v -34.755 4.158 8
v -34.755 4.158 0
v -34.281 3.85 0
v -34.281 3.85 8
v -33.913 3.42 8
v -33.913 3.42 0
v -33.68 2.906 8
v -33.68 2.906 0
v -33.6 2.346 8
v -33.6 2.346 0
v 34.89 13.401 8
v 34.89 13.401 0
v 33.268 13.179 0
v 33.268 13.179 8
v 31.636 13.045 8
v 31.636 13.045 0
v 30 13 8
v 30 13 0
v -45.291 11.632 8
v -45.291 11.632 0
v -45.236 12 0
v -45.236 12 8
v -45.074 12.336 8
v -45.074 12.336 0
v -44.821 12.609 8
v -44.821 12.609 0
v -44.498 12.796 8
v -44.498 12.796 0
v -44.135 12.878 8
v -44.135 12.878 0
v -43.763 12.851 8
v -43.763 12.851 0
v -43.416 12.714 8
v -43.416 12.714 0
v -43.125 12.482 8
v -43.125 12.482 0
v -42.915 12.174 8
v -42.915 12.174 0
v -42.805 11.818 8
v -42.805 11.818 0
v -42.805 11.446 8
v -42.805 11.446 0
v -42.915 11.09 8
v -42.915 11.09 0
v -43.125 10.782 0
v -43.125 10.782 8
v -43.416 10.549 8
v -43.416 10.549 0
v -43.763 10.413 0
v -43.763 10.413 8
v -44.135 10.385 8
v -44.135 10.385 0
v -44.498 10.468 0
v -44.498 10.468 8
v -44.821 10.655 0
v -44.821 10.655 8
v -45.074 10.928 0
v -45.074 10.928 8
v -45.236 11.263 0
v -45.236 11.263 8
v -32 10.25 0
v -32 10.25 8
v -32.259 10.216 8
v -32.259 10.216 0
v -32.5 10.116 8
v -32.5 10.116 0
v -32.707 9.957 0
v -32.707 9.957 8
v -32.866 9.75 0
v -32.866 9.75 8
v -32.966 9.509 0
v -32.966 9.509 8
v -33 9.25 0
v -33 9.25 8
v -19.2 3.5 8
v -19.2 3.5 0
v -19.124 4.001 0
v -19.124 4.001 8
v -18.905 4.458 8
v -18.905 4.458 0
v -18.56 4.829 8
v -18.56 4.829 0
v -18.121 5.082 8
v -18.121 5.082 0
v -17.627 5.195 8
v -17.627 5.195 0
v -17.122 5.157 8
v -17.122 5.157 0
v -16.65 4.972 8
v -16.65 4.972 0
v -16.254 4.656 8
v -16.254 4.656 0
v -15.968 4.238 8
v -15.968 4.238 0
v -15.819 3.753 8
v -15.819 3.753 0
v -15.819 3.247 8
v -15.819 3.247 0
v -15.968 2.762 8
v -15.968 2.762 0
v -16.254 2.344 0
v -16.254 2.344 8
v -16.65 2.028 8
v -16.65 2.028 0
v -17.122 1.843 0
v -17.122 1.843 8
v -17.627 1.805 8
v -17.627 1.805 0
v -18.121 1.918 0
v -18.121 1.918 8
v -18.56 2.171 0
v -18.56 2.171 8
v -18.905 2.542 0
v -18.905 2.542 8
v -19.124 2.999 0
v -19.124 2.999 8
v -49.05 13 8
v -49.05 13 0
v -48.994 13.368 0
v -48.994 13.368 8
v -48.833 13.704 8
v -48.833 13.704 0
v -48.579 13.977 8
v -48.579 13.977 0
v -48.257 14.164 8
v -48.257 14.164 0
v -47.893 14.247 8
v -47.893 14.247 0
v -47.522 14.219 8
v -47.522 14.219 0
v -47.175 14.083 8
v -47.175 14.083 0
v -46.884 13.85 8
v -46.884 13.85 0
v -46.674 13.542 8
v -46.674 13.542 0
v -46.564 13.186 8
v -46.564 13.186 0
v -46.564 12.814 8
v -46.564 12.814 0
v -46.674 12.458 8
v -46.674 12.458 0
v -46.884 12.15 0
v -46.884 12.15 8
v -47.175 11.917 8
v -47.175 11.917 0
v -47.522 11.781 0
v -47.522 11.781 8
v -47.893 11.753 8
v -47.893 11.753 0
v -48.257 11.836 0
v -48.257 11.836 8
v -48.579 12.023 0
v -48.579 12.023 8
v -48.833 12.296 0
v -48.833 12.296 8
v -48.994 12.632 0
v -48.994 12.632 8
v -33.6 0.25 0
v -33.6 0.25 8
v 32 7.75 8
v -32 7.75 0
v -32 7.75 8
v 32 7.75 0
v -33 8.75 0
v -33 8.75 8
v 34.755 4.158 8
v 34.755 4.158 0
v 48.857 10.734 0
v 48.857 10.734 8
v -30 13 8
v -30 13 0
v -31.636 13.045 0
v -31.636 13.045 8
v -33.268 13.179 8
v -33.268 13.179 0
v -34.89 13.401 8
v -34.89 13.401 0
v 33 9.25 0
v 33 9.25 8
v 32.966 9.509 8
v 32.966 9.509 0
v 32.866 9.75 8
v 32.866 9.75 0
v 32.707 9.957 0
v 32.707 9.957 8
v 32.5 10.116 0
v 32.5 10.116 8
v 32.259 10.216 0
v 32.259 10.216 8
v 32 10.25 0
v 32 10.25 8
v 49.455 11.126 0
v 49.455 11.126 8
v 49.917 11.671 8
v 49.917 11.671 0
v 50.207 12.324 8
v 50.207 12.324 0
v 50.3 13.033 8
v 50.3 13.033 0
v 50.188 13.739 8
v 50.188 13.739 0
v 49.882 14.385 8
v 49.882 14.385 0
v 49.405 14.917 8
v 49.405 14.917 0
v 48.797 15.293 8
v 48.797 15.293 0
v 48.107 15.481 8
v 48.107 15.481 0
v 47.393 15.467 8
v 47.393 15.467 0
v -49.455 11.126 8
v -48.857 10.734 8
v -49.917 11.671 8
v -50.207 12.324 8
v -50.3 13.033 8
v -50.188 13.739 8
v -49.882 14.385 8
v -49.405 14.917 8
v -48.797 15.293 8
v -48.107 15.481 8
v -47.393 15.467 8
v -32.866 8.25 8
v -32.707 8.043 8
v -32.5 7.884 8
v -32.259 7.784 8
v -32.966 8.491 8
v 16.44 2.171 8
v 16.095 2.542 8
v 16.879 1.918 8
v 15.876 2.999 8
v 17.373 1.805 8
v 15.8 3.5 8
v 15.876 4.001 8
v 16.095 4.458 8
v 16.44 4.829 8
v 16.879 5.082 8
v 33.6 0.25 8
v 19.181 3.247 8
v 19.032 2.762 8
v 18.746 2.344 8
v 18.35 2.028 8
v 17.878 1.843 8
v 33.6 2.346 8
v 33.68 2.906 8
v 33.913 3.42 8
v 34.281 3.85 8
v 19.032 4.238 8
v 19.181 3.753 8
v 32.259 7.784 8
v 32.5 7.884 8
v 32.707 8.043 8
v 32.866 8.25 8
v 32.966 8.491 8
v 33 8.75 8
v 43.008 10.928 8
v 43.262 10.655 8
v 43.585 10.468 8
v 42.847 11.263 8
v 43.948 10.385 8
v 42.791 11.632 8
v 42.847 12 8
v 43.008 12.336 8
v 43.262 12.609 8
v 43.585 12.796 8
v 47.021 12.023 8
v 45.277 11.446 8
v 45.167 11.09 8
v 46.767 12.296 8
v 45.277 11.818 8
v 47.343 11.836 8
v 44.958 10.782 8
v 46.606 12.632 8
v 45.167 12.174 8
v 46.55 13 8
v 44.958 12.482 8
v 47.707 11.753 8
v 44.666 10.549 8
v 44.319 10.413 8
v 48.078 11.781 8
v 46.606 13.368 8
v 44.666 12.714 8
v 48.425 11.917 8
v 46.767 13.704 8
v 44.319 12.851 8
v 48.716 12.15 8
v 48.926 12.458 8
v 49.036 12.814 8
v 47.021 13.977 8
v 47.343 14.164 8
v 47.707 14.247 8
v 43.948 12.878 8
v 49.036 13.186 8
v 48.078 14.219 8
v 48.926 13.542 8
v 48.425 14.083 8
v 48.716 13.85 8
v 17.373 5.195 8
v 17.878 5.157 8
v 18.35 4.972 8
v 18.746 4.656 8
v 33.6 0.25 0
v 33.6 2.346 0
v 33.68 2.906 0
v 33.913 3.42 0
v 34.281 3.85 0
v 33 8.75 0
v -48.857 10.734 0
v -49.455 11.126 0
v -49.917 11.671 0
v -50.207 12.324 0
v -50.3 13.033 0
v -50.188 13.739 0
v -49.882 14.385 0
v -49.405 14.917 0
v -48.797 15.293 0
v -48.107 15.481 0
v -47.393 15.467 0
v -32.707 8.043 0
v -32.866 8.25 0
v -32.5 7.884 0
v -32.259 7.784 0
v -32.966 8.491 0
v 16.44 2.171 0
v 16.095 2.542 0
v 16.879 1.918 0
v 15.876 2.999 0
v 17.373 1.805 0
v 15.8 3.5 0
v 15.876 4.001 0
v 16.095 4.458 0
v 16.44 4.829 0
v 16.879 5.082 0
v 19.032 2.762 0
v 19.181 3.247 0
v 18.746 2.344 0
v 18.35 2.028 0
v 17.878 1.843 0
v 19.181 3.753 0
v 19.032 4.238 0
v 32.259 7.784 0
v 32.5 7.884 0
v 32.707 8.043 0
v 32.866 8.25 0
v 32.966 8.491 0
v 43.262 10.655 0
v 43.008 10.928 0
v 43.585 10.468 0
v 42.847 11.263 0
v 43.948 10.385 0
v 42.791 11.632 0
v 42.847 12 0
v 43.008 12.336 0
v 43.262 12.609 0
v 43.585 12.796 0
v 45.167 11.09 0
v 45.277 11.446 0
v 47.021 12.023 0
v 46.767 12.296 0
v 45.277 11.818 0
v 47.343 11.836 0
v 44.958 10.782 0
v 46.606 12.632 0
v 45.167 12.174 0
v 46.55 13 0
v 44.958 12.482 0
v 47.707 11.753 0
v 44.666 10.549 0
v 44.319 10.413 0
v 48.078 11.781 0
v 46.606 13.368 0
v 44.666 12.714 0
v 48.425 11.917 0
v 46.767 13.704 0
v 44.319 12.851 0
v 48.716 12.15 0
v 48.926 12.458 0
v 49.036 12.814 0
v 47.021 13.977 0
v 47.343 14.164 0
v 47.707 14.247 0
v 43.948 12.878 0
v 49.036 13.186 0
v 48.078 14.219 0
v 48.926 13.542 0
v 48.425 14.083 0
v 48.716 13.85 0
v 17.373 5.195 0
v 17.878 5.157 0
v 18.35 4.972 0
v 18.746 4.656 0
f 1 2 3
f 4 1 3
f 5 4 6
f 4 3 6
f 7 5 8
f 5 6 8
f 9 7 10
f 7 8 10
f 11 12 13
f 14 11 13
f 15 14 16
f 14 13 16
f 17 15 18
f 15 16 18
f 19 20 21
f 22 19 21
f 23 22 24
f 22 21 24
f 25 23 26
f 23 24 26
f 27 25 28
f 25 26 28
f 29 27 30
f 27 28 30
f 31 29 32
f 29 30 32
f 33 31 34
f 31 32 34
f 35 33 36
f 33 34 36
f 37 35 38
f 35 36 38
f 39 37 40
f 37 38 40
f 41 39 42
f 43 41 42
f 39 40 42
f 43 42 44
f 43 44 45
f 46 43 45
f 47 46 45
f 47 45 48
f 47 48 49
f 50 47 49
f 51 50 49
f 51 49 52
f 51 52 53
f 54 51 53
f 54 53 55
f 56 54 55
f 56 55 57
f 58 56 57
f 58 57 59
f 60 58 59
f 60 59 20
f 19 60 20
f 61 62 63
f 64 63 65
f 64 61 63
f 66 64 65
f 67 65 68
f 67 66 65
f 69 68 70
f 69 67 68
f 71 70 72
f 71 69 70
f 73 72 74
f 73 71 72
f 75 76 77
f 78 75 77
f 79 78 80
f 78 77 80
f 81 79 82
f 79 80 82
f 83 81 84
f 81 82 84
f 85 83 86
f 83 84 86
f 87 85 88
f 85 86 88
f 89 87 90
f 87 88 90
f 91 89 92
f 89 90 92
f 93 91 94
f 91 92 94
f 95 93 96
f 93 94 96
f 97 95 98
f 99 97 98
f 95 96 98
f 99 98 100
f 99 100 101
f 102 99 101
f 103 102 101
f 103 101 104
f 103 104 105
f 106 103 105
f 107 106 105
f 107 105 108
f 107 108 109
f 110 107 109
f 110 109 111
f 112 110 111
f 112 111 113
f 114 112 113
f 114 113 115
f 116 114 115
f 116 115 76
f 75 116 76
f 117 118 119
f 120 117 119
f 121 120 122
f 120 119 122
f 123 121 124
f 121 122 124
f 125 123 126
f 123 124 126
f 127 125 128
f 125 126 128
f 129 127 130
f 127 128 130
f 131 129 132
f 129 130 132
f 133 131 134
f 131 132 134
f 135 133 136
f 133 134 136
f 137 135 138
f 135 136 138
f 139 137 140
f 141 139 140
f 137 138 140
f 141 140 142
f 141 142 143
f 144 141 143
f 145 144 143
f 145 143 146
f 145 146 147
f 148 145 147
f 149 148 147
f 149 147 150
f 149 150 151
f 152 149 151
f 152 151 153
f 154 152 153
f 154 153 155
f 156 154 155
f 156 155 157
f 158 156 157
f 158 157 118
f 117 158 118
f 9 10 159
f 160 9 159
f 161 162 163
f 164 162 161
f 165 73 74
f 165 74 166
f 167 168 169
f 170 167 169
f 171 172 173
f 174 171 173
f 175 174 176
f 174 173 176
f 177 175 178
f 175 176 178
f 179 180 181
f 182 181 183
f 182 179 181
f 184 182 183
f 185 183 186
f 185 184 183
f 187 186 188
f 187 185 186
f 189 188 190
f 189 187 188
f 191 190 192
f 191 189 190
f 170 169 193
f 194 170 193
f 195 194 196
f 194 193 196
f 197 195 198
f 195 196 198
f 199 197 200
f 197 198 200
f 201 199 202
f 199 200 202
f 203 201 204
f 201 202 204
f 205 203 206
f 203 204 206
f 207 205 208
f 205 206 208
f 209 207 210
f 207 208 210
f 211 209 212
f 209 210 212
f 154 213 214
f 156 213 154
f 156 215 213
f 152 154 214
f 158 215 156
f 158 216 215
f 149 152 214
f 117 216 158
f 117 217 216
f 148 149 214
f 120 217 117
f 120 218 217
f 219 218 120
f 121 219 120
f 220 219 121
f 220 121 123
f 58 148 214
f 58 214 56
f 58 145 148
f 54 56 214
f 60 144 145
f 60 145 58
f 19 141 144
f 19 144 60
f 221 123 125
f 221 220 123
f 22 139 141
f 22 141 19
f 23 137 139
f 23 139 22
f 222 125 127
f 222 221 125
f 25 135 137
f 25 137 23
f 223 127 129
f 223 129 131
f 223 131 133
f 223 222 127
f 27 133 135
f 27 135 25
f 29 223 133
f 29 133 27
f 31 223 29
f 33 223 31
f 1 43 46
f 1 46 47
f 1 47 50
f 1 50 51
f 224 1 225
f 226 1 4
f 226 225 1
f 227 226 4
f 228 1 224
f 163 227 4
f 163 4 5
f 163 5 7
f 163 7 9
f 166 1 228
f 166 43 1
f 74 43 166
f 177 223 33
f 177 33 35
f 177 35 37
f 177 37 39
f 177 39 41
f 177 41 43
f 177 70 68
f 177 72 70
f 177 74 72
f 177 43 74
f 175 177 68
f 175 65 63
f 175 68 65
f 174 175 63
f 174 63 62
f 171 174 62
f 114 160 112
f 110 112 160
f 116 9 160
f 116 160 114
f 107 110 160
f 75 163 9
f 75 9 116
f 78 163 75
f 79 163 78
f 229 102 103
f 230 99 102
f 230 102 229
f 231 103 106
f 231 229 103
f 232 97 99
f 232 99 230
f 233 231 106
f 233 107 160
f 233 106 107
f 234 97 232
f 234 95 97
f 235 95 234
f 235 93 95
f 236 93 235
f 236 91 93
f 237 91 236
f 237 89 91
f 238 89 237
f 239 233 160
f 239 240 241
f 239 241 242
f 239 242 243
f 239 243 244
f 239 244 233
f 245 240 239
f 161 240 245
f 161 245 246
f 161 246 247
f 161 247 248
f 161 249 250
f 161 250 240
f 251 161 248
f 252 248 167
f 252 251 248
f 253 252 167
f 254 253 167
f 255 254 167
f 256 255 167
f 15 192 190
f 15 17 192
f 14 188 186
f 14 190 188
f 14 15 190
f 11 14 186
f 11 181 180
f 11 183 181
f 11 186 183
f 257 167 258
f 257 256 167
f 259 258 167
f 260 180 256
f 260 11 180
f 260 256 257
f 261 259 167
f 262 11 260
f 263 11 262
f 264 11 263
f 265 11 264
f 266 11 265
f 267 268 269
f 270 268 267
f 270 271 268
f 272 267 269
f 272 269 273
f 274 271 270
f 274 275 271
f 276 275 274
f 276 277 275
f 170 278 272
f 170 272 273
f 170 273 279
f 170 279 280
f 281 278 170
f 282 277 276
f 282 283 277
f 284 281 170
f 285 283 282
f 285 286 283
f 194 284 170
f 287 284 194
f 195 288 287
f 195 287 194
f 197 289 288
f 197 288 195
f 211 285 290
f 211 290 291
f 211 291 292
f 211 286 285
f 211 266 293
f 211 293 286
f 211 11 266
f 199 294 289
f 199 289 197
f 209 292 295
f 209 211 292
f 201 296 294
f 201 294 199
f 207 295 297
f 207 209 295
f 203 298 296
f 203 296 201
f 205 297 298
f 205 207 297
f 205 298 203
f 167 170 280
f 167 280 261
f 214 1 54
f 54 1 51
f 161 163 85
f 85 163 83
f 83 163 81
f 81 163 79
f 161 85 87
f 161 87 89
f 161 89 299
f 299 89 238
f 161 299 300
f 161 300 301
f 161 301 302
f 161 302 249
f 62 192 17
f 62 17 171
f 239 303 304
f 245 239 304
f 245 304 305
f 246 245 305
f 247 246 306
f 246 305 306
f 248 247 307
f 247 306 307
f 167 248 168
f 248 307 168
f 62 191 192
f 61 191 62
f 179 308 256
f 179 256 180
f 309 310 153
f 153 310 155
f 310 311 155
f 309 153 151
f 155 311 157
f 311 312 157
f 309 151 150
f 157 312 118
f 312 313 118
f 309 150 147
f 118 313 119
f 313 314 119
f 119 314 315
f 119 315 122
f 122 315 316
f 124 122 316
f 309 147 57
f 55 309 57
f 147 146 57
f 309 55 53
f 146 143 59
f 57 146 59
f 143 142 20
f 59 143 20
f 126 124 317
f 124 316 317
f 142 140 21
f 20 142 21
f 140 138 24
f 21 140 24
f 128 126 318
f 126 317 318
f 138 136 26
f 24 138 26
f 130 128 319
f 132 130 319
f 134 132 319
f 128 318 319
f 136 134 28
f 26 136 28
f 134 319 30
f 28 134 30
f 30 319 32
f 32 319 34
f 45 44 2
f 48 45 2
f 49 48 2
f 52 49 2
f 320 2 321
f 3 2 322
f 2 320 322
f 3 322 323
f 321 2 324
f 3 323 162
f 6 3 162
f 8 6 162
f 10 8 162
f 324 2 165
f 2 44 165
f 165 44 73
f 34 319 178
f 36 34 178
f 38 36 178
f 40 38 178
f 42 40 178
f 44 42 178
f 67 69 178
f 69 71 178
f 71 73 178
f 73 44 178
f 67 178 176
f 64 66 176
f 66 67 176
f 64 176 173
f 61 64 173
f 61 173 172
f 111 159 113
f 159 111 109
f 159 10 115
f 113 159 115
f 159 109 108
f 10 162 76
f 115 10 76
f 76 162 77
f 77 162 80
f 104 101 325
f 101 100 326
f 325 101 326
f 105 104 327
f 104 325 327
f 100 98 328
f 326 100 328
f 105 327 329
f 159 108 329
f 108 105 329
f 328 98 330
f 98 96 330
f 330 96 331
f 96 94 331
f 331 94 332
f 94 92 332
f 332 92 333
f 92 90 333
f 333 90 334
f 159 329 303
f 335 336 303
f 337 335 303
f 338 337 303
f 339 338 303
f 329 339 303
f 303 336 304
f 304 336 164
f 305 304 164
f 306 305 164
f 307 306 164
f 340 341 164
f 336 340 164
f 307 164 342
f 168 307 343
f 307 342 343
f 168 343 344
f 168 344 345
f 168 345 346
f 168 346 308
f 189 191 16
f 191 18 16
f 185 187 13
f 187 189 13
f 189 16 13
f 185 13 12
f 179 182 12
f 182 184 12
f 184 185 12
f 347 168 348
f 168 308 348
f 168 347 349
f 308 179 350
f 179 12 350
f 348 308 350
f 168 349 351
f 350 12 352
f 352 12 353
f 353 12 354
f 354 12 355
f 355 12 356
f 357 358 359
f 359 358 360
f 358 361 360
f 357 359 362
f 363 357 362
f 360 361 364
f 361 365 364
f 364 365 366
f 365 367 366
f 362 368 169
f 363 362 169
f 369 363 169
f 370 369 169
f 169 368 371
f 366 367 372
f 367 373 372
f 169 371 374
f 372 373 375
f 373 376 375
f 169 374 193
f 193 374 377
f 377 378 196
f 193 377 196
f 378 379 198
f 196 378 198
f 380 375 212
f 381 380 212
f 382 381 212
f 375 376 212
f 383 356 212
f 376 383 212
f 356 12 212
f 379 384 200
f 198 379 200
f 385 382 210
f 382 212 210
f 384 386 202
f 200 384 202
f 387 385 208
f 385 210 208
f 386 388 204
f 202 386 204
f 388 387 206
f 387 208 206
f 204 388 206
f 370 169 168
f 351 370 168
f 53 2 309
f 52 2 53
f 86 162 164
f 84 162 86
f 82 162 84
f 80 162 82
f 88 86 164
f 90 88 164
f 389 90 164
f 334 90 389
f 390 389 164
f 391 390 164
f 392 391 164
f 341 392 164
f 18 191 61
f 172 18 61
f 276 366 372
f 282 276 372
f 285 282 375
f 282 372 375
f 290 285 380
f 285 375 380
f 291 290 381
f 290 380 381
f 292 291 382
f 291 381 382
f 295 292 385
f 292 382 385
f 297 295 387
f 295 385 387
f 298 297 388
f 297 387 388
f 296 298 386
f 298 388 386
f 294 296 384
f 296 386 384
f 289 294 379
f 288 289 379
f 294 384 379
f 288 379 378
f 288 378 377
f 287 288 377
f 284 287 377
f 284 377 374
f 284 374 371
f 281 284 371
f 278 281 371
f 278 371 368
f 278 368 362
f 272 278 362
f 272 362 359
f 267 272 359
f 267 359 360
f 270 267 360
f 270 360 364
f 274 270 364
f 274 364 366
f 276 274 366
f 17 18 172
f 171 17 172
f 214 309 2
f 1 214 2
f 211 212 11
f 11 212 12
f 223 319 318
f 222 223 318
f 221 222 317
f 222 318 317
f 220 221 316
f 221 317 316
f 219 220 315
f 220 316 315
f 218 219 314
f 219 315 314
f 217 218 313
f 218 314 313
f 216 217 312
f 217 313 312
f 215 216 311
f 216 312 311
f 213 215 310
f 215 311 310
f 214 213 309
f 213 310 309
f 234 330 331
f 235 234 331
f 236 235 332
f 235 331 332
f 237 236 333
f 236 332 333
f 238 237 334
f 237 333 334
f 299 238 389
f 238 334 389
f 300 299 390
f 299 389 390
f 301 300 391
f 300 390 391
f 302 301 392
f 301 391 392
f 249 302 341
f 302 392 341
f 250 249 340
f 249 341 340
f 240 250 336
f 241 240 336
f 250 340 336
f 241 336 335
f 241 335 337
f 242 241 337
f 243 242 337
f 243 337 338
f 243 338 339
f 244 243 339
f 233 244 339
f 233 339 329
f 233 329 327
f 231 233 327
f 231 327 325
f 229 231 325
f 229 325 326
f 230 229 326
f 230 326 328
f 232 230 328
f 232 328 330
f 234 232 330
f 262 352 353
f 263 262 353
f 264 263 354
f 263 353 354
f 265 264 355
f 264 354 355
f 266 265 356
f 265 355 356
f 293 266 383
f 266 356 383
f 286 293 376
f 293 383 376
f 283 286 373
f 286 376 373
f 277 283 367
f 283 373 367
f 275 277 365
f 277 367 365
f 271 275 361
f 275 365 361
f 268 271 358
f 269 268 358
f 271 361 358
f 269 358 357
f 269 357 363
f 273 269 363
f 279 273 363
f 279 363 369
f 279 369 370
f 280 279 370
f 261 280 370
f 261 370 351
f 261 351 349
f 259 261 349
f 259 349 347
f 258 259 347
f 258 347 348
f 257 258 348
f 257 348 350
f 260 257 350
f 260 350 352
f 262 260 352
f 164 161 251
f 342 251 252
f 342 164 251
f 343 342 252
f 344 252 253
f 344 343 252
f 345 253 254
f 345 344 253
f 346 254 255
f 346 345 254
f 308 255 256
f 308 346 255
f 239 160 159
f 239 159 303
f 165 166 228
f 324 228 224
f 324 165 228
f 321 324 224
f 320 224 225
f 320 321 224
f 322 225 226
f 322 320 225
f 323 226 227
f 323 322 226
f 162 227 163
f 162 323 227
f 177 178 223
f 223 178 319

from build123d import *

# Parameters (mm, degrees)
SKETCH1_R             = 0.5
BOSS_EXTRUDE1_DEPTH   = 8
M3_CLEARANCE_HOLE1_D  = 3.4
M3X0_5_TAPPED_HOLE1_D = 2.5
SKETCH6_W             = 67.2
SKETCH6_H             = 8
CUT_EXTRUDE1_DEPTH    = 0.25


with BuildPart() as part:
    # Sketch1 → Boss-Extrude1 (new body)
    with BuildSketch(Plane.XY):
        with BuildLine():
            Line((-33.6, 0), (33.6, 0))
            Line((33.6, 0), (33.6, 2.345845935))
            ThreePointArc((33.6, 2.345845935), (33.913217108, 3.420445152), (34.754763477, 4.158461509))
            Line((34.754763477, 4.158461509), (48.856545654, 10.734230532))
            ThreePointArc((48.856545654, 10.734230532), (50.188323304, 13.73885844), (47.392535439, 15.466571027))
            Line((47.392535439, 15.466571027), (34.889574734, 13.401147676))
            ThreePointArc((34.889574734, 13.401147676), (32.45300125, 13.100455106), (30, 13))
            Line((30, 13), (-30, 13))
            ThreePointArc((-30, 13), (-32.45300125, 13.100455106), (-34.889574734, 13.401147676))
            Line((-34.889574734, 13.401147676), (-47.392535439, 15.466571027))
            ThreePointArc((-47.392535439, 15.466571027), (-50.188323304, 13.73885844), (-48.856545654, 10.734230532))
            Line((-48.856545654, 10.734230532), (-34.754763477, 4.158461509))
            ThreePointArc((-34.754763477, 4.158461509), (-33.913217108, 3.420445152), (-33.6, 2.345845935))
            Line((-33.6, 2.345845935), (-33.6, 0))
        make_face()
        with Locations((-47.8, 13)):
            Circle(SKETCH1_R, mode=Mode.SUBTRACT)
        with Locations((47.8, 13)):
            Circle(SKETCH1_R, mode=Mode.SUBTRACT)
        with Locations((-44.041229517, 11.631919427)):
            Circle(SKETCH1_R, mode=Mode.SUBTRACT)
        with Locations((44.041229517, 11.631919427)):
            Circle(SKETCH1_R, mode=Mode.SUBTRACT)
        with BuildLine():
            Line((33, 8.75), (33, 9.25))
            ThreePointArc((33, 9.25), (32.707106781, 9.957106781), (32, 10.25))
            Line((32, 10.25), (-32, 10.25))
            ThreePointArc((-32, 10.25), (-32.707106781, 9.957106781), (-33, 9.25))
            Line((-33, 9.25), (-33, 8.75))
            ThreePointArc((-33, 8.75), (-32.707106781, 8.042893219), (-32, 7.75))
            Line((-32, 7.75), (32, 7.75))
            ThreePointArc((32, 7.75), (32.707106781, 8.042893219), (33, 8.75))
        make_face(mode=Mode.SUBTRACT)
    extrude(amount=BOSS_EXTRUDE1_DEPTH)

    # M3 Clearance Hole1 (through all)
    with Locations(Plane.XY.offset(8)):
        with Locations((-17.5, 3.5), (17.5, 3.5)):
            Hole(M3_CLEARANCE_HOLE1_D / 2)

    # M3x0.5 Tapped Hole1 (through all)
    with Locations(Plane.XY.offset(8)):
        with Locations((-47.8, 13), (47.8, 13), (-44.041229517, 11.631919427), (44.041229517, 11.631919427)):
            Hole(M3X0_5_TAPPED_HOLE1_D / 2)

    # Sketch6 → Cut-Extrude1 (cut)
    with BuildSketch(Plane.XZ):
        with Locations((0, 4)):
            Rectangle(SKETCH6_W, SKETCH6_H)
    extrude(amount=-CUT_EXTRUDE1_DEPTH, mode=Mode.SUBTRACT)


solid = part.part
